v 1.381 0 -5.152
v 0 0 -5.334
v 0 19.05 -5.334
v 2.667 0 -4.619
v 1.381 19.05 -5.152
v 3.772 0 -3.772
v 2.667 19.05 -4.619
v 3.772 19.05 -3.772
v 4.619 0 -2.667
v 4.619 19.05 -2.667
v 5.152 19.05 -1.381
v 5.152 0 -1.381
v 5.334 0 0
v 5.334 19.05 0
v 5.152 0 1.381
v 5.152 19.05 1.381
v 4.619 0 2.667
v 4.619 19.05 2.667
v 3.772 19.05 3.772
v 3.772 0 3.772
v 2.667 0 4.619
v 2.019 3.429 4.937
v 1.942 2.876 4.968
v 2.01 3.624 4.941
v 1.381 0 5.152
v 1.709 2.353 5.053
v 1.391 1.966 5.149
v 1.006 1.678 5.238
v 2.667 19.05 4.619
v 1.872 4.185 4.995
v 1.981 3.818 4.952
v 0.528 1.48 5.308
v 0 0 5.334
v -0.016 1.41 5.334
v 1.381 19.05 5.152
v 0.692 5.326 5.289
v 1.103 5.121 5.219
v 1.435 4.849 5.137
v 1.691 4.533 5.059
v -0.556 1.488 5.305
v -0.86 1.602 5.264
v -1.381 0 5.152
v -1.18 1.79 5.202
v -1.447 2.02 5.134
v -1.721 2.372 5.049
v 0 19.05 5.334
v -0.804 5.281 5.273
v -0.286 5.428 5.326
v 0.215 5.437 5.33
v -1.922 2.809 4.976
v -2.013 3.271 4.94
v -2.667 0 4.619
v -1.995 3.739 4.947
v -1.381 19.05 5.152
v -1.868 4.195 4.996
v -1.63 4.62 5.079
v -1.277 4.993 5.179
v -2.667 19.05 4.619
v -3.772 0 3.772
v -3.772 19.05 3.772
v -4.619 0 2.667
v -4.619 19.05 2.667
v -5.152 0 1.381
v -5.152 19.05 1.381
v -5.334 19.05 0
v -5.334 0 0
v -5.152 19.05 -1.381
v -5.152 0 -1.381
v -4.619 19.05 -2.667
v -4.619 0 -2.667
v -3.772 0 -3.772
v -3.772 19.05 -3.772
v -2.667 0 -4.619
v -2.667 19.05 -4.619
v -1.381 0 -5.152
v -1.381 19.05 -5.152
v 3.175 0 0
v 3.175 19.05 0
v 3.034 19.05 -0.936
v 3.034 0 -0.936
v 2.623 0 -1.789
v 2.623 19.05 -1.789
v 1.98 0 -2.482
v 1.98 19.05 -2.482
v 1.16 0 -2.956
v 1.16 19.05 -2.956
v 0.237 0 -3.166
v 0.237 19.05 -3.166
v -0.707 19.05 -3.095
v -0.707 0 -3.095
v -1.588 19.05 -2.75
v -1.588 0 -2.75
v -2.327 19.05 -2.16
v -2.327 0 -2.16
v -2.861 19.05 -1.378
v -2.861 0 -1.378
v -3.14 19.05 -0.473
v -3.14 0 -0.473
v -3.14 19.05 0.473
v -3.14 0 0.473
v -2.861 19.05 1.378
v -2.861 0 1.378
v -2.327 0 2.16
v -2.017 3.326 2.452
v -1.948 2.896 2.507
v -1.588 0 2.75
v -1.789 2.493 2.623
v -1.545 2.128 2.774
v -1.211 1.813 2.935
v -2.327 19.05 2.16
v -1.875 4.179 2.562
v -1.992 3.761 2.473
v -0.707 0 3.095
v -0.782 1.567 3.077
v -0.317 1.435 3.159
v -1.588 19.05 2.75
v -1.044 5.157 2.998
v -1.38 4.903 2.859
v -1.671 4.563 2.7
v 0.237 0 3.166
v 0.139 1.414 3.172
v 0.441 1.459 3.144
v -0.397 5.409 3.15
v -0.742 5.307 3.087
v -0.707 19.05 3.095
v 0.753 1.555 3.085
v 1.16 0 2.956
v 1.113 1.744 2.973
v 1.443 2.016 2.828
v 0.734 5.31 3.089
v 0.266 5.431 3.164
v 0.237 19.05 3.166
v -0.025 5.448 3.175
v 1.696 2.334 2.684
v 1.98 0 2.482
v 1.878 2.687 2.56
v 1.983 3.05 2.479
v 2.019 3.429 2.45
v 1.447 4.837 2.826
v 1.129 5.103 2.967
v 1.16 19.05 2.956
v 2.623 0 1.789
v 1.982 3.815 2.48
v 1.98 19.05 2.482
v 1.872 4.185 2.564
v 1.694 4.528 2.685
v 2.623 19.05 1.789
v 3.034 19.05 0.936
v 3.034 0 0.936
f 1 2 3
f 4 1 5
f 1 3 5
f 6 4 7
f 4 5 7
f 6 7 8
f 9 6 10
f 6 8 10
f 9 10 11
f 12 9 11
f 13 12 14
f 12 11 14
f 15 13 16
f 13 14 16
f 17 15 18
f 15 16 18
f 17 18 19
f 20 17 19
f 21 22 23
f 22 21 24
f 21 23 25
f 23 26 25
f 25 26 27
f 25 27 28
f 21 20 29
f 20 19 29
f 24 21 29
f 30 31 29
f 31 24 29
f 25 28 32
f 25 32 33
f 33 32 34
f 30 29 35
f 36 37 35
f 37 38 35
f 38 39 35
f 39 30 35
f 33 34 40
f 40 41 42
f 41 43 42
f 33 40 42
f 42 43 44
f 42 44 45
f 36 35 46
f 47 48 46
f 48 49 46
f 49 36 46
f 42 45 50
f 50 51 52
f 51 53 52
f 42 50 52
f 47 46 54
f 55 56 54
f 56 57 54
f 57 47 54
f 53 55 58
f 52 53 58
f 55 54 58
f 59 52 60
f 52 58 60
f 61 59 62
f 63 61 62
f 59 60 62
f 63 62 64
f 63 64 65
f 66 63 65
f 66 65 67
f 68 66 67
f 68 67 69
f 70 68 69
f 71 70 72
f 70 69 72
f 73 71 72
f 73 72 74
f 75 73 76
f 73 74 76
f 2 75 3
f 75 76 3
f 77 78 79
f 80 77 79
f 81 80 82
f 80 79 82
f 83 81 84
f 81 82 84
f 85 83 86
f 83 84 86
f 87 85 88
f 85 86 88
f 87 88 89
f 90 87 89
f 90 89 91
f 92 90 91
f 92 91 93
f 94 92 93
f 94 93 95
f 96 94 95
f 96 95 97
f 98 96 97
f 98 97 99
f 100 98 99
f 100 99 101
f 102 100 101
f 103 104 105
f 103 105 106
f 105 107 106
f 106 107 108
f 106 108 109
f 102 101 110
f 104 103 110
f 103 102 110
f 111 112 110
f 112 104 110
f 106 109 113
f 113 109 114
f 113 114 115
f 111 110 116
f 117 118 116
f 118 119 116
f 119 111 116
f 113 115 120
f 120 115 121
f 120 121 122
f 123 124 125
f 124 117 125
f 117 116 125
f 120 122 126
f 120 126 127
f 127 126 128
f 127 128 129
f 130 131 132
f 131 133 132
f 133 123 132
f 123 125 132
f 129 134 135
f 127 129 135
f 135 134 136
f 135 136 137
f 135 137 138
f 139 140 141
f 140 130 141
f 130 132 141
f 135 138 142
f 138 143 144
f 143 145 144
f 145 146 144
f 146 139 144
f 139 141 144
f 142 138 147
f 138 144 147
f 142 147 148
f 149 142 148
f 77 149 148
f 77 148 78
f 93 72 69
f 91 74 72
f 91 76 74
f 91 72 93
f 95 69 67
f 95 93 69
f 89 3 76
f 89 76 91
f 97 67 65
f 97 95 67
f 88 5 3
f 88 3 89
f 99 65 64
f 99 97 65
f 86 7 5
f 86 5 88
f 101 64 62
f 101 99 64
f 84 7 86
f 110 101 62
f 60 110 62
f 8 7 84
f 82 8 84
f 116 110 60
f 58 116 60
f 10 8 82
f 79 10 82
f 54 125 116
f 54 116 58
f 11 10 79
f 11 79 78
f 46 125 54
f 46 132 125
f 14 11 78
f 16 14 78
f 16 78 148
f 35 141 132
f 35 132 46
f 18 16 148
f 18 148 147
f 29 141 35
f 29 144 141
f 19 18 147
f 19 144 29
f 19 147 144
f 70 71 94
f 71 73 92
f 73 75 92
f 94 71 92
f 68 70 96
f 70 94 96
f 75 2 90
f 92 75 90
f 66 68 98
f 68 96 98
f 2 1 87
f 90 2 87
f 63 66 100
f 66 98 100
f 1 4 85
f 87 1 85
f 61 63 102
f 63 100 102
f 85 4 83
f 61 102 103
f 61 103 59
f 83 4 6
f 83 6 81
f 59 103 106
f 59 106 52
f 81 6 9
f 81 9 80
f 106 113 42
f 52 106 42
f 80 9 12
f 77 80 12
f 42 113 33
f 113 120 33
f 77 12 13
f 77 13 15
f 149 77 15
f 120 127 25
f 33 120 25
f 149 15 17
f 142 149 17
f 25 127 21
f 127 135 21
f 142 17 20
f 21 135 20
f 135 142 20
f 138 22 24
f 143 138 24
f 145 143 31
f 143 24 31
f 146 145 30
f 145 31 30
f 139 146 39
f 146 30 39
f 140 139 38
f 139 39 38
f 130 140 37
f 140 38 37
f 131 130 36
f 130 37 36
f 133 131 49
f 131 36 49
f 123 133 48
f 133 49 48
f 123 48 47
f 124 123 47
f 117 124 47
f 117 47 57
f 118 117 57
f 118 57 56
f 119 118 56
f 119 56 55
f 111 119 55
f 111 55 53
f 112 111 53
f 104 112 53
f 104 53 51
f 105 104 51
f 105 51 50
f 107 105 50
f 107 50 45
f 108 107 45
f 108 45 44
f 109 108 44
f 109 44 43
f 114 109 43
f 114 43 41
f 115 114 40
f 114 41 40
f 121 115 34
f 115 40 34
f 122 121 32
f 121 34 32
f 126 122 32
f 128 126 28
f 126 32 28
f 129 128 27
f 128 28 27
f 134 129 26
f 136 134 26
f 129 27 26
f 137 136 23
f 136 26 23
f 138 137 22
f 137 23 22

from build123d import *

# Parameters (mm, degrees)
SKETCH1_W                        = 5.334
SKETCH1_H                        = 19.05
F_1_4_0_25_DIAMETER_HOLE1_D      = 6.35
F_21_0_159_DIAMETER_HOLE1_REACH  = 21.654
F_21_0_159_DIAMETER_HOLE1_BORE_R = 2.0193


with BuildPart() as part:
    # Sketch1 → Revolve1 (revolve)
    with BuildSketch(Plane.XY, mode=Mode.PRIVATE) as revolve1_sk:
        with Locations((2.667, 9.525)):
            Rectangle(SKETCH1_W, SKETCH1_H)
    revolve(revolve1_sk.sketch.rotate(Axis((0, 19.05, 0), (0, -1, 0)), 270), axis=Axis((0, 19.05, 0), (0, -1, 0)))

    # 1/4 (0.25) Diameter Hole1 (through all)
    with Locations(Plane(origin=(0, 0, 0), x_dir=(-1, 0, 0), z_dir=(0, -1, 0))):
        with Locations((0, 0)):
            Hole(F_1_4_0_25_DIAMETER_HOLE1_D / 2)

    # #21 (0.159) Diameter Hole1 bore (on position points) → #21 (0.159) Diameter Hole1 (cut, up to next)
    with BuildSketch(Plane(origin=(0, 3.429, 5.334), x_dir=(1, 0, 0), z_dir=(0, 0, 1)), mode=Mode.PRIVATE) as f_21_0_159_diameter_hole1_sk1:
        Circle(F_21_0_159_DIAMETER_HOLE1_BORE_R)
    f_21_0_159_diameter_hole1_tool1 = extrude(f_21_0_159_diameter_hole1_sk1.sketch, amount=-F_21_0_159_DIAMETER_HOLE1_REACH, mode=Mode.PRIVATE) & part.part
    add(f_21_0_159_diameter_hole1_tool1.solids().sort_by_distance((0, 3.429, 5.334))[0], mode=Mode.SUBTRACT)


solid = part.part
